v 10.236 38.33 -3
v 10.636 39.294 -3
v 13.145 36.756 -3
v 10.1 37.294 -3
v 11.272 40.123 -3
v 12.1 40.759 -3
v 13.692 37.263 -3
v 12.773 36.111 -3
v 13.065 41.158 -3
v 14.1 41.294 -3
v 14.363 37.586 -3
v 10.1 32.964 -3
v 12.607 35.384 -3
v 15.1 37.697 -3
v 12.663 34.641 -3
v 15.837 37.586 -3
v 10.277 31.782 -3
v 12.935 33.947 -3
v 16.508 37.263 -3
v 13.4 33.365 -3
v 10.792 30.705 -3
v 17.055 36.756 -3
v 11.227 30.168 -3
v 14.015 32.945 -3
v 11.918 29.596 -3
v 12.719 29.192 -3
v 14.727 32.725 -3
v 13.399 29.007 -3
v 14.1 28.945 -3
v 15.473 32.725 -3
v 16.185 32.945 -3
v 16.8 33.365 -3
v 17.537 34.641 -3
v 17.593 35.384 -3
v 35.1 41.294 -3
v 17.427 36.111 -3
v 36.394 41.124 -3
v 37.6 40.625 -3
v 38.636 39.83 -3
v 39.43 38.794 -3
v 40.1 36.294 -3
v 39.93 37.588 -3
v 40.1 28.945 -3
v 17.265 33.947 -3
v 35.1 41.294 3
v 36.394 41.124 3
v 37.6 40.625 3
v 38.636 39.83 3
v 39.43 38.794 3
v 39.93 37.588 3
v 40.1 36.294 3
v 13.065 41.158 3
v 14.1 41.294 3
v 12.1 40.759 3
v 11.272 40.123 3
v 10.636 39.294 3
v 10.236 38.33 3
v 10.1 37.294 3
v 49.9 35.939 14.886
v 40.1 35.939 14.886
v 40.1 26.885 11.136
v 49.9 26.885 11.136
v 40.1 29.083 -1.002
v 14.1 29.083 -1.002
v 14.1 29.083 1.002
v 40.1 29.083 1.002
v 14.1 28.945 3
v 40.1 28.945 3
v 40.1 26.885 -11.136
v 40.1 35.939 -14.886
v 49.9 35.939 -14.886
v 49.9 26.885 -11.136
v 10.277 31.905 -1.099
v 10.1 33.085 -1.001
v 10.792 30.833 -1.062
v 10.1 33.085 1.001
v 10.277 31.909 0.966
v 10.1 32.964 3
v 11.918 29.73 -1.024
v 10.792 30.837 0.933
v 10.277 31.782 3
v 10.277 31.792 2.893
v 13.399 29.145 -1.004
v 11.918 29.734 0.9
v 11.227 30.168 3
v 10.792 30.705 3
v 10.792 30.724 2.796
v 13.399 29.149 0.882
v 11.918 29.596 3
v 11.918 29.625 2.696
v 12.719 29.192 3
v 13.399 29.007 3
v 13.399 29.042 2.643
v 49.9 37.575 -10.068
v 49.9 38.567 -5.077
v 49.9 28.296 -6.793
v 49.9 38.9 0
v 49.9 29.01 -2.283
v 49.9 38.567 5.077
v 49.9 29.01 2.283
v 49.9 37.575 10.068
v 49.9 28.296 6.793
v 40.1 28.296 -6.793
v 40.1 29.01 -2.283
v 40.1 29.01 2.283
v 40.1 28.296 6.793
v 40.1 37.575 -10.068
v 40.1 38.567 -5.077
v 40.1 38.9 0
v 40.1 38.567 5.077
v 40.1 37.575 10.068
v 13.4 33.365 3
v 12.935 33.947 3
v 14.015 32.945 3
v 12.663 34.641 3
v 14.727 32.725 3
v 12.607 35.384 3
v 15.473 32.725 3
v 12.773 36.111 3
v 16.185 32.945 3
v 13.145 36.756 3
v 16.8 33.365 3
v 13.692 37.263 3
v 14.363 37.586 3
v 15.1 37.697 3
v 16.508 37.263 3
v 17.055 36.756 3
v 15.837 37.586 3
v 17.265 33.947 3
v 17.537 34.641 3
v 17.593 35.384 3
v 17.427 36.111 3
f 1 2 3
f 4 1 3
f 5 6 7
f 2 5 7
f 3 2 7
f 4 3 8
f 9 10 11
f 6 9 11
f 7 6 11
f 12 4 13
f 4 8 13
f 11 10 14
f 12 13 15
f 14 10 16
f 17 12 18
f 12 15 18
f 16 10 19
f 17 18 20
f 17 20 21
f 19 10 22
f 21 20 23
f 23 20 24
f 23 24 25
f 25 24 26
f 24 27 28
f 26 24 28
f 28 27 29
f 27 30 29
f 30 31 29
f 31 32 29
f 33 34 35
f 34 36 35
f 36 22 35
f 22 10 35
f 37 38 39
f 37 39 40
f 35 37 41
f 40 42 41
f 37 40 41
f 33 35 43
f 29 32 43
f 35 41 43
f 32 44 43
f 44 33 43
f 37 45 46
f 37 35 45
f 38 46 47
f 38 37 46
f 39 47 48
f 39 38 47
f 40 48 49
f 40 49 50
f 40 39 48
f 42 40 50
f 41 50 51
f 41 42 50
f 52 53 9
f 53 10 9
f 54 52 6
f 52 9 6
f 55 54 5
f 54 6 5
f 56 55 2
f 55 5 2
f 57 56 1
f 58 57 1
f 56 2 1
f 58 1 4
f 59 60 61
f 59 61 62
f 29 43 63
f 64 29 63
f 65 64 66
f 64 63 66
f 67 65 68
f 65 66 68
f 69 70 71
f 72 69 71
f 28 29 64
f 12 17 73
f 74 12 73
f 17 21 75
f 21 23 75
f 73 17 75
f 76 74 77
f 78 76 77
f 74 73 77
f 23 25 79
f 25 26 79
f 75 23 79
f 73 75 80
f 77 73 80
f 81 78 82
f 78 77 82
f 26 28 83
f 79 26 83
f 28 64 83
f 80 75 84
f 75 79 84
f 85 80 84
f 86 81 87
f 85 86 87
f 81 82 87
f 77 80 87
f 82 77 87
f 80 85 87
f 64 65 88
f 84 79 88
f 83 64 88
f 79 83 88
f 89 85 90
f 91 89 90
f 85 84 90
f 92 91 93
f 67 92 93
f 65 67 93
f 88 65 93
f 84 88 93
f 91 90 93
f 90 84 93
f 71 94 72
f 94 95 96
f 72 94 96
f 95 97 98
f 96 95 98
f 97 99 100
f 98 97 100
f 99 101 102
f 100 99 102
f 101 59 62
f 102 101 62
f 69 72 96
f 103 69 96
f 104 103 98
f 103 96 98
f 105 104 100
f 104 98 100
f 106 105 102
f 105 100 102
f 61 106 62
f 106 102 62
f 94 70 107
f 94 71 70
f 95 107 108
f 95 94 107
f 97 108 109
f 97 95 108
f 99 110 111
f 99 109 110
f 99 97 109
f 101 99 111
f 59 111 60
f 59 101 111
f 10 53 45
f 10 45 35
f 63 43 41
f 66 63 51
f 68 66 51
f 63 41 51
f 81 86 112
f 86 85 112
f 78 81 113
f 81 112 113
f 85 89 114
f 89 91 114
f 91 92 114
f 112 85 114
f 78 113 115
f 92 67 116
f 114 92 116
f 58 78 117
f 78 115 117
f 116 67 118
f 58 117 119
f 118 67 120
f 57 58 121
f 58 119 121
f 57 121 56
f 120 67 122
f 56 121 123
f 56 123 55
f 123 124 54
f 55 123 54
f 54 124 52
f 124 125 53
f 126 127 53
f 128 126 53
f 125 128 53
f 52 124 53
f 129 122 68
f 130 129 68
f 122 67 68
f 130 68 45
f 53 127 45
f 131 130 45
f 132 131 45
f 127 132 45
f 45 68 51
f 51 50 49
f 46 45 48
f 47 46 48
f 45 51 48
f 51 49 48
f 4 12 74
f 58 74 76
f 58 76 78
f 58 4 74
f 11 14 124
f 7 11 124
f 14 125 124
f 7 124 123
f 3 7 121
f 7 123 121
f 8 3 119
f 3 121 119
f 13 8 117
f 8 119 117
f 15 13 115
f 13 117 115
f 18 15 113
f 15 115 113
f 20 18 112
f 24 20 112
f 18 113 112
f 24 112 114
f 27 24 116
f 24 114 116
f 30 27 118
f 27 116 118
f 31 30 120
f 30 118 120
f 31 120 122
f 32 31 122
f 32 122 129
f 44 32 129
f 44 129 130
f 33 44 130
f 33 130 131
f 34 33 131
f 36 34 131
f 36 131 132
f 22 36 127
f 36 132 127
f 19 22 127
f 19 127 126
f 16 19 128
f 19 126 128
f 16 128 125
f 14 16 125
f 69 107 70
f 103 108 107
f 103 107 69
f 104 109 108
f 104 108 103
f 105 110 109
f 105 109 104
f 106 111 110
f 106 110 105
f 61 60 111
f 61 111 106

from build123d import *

# Parameters (mm, degrees)
SKETCH_1_W          = 9.8
SKETCH_1_H          = 9.8
REVOLVE_1_ANGLE     = 45
EXTRUDE_1_DEPTH     = 30
SKETCH_4_R          = 2.5
CUT_EXTRUDE_1_DEPTH = 25
FILLET_5_R          = 4
FILLET_6_R          = 5


with BuildPart() as part:
    # Эскиз1 → Повернуть1 (revolve, symmetric)
    with BuildSketch(Plane.XY) as revolve_1_sk:
        with Locations((45, 34)):
            Rectangle(SKETCH_1_W, SKETCH_1_H)
    revolve(axis=Axis((66.456117982, 0, 0), (-1, 0, 0)), revolution_arc=REVOLVE_1_ANGLE / 2)
    revolve(revolve_1_sk.sketch, axis=Axis((66.456117982, 0, 0), (1, 0, 0)), revolution_arc=REVOLVE_1_ANGLE / 2)


with BuildPart() as body_2:
    # Эскиз2 → Бобышка-Вытянуть1 (new body)
    with BuildSketch(Plane.ZY.offset(-40.1)):
        with BuildLine():
            Line((-3, 41.294403104), (-3, 28.944947746))
            ThreePointArc((-3, 28.944947746), (0, 29.1), (3, 28.944947746))
            Line((3, 28.944947746), (3, 41.294403104))
            Line((3, 41.294403104), (-3, 41.294403104))
        make_face()
    extrude(amount=EXTRUDE_1_DEPTH)

    # Эскиз4 → Вырез-Вытянуть1 (cut, symmetric)
    with BuildSketch(Plane.XY):
        with Locations(Location((15.1, 35.197201552, 0), (0, 0, 90))):
            Circle(SKETCH_4_R)
    extrude(amount=CUT_EXTRUDE_1_DEPTH, both=True, mode=Mode.SUBTRACT)

    # Скругление5
    fillet_5_edges = [body_2.edges().sort_by_distance(p)[0] for p in [
        (10.1, 29.1, 0),
        (10.1, 41.294403104, 0),
    ]]
    fillet(fillet_5_edges, radius=FILLET_5_R)

    # Скругление6
    fillet_6_edges = [body_2.edges().sort_by_distance(p)[0] for p in [
        (40.1, 41.294403104, 0),
    ]]
    fillet(fillet_6_edges, radius=FILLET_6_R)


solid = Compound([part.part, body_2.part])
